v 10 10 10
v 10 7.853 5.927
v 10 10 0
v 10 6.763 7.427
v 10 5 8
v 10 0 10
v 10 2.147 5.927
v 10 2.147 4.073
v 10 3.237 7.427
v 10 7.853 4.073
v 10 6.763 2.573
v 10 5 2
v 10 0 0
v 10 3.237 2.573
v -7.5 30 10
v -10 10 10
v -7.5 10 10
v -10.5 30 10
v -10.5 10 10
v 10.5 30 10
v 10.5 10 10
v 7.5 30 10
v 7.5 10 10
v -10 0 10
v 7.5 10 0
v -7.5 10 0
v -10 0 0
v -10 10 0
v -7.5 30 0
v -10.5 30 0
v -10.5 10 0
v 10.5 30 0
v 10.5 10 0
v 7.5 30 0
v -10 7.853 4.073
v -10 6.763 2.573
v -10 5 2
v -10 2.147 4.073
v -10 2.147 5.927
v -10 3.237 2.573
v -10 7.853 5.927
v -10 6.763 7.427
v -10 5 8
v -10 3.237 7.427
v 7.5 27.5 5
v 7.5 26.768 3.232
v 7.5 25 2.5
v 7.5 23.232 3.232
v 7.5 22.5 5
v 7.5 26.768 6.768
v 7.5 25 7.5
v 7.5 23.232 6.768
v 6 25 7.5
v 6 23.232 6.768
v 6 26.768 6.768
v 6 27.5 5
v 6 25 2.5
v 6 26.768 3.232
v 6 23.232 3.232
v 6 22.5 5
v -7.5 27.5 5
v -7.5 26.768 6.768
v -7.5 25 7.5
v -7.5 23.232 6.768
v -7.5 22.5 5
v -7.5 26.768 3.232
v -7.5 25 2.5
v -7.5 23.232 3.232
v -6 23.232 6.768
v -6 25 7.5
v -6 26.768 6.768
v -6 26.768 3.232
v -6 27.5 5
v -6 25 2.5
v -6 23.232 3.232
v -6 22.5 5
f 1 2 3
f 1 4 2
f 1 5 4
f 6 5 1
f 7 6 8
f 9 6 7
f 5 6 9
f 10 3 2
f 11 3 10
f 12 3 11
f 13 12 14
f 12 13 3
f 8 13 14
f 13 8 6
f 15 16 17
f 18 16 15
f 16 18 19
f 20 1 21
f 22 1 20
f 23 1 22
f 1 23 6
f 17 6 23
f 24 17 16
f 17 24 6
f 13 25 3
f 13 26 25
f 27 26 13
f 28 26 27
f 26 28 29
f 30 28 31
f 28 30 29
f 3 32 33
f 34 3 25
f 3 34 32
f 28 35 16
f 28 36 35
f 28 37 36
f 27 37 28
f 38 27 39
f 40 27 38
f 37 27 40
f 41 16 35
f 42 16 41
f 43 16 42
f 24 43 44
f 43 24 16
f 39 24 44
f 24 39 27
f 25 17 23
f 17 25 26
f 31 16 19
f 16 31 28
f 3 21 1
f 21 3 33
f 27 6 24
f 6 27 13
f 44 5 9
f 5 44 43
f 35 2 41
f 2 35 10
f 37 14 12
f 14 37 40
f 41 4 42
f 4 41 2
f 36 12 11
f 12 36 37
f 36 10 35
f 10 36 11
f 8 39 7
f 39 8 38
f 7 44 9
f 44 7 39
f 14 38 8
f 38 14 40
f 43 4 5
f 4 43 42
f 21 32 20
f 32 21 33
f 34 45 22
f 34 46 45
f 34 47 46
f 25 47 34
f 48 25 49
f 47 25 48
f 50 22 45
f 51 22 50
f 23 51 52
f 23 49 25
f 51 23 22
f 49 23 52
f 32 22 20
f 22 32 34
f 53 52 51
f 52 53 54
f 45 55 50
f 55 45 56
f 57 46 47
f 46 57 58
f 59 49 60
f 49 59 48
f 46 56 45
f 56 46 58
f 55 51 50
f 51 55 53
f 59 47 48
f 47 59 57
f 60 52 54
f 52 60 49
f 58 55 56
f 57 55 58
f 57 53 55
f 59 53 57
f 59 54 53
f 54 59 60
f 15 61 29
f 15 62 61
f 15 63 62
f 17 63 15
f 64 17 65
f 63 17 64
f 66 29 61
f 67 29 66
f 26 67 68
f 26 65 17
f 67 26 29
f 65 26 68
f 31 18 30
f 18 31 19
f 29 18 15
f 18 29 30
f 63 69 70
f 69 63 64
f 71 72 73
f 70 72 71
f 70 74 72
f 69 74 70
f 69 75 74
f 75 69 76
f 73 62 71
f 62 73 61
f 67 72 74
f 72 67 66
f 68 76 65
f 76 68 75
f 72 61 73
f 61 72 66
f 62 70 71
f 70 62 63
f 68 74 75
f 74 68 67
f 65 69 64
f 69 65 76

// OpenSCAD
union() {
	union() {
		difference() {
			translate(v = [-10.0000000000, 0, 0]) {
				cube(size = [20, 10, 10]);
			}
			translate(v = [0, 5, 5]) {
				rotate(a = 90, v = [0, 1, 0]) {
					cylinder(h = 22, r = 3, center = true);
				}
			}
		}
		translate(v = [7.5000000000, 10, 0]) {
			cube(size = [3, 20, 10]);
			translate(v = [0, 15, 5]) {
				rotate(a = 90, v = [0, 1, 0]) {
					cylinder(h = 3, r = 2.5000000000, center = true);
				}
			}
		}
		translate(v = [-10.5000000000, 10, 0]) {
			cube(size = [3, 20, 10]);
			translate(v = [3, 15, 5]) {
				rotate(a = 90, v = [0, 1, 0]) {
					cylinder(h = 3, r = 2.5000000000, center = true);
				}
			}
		}
	}
}
